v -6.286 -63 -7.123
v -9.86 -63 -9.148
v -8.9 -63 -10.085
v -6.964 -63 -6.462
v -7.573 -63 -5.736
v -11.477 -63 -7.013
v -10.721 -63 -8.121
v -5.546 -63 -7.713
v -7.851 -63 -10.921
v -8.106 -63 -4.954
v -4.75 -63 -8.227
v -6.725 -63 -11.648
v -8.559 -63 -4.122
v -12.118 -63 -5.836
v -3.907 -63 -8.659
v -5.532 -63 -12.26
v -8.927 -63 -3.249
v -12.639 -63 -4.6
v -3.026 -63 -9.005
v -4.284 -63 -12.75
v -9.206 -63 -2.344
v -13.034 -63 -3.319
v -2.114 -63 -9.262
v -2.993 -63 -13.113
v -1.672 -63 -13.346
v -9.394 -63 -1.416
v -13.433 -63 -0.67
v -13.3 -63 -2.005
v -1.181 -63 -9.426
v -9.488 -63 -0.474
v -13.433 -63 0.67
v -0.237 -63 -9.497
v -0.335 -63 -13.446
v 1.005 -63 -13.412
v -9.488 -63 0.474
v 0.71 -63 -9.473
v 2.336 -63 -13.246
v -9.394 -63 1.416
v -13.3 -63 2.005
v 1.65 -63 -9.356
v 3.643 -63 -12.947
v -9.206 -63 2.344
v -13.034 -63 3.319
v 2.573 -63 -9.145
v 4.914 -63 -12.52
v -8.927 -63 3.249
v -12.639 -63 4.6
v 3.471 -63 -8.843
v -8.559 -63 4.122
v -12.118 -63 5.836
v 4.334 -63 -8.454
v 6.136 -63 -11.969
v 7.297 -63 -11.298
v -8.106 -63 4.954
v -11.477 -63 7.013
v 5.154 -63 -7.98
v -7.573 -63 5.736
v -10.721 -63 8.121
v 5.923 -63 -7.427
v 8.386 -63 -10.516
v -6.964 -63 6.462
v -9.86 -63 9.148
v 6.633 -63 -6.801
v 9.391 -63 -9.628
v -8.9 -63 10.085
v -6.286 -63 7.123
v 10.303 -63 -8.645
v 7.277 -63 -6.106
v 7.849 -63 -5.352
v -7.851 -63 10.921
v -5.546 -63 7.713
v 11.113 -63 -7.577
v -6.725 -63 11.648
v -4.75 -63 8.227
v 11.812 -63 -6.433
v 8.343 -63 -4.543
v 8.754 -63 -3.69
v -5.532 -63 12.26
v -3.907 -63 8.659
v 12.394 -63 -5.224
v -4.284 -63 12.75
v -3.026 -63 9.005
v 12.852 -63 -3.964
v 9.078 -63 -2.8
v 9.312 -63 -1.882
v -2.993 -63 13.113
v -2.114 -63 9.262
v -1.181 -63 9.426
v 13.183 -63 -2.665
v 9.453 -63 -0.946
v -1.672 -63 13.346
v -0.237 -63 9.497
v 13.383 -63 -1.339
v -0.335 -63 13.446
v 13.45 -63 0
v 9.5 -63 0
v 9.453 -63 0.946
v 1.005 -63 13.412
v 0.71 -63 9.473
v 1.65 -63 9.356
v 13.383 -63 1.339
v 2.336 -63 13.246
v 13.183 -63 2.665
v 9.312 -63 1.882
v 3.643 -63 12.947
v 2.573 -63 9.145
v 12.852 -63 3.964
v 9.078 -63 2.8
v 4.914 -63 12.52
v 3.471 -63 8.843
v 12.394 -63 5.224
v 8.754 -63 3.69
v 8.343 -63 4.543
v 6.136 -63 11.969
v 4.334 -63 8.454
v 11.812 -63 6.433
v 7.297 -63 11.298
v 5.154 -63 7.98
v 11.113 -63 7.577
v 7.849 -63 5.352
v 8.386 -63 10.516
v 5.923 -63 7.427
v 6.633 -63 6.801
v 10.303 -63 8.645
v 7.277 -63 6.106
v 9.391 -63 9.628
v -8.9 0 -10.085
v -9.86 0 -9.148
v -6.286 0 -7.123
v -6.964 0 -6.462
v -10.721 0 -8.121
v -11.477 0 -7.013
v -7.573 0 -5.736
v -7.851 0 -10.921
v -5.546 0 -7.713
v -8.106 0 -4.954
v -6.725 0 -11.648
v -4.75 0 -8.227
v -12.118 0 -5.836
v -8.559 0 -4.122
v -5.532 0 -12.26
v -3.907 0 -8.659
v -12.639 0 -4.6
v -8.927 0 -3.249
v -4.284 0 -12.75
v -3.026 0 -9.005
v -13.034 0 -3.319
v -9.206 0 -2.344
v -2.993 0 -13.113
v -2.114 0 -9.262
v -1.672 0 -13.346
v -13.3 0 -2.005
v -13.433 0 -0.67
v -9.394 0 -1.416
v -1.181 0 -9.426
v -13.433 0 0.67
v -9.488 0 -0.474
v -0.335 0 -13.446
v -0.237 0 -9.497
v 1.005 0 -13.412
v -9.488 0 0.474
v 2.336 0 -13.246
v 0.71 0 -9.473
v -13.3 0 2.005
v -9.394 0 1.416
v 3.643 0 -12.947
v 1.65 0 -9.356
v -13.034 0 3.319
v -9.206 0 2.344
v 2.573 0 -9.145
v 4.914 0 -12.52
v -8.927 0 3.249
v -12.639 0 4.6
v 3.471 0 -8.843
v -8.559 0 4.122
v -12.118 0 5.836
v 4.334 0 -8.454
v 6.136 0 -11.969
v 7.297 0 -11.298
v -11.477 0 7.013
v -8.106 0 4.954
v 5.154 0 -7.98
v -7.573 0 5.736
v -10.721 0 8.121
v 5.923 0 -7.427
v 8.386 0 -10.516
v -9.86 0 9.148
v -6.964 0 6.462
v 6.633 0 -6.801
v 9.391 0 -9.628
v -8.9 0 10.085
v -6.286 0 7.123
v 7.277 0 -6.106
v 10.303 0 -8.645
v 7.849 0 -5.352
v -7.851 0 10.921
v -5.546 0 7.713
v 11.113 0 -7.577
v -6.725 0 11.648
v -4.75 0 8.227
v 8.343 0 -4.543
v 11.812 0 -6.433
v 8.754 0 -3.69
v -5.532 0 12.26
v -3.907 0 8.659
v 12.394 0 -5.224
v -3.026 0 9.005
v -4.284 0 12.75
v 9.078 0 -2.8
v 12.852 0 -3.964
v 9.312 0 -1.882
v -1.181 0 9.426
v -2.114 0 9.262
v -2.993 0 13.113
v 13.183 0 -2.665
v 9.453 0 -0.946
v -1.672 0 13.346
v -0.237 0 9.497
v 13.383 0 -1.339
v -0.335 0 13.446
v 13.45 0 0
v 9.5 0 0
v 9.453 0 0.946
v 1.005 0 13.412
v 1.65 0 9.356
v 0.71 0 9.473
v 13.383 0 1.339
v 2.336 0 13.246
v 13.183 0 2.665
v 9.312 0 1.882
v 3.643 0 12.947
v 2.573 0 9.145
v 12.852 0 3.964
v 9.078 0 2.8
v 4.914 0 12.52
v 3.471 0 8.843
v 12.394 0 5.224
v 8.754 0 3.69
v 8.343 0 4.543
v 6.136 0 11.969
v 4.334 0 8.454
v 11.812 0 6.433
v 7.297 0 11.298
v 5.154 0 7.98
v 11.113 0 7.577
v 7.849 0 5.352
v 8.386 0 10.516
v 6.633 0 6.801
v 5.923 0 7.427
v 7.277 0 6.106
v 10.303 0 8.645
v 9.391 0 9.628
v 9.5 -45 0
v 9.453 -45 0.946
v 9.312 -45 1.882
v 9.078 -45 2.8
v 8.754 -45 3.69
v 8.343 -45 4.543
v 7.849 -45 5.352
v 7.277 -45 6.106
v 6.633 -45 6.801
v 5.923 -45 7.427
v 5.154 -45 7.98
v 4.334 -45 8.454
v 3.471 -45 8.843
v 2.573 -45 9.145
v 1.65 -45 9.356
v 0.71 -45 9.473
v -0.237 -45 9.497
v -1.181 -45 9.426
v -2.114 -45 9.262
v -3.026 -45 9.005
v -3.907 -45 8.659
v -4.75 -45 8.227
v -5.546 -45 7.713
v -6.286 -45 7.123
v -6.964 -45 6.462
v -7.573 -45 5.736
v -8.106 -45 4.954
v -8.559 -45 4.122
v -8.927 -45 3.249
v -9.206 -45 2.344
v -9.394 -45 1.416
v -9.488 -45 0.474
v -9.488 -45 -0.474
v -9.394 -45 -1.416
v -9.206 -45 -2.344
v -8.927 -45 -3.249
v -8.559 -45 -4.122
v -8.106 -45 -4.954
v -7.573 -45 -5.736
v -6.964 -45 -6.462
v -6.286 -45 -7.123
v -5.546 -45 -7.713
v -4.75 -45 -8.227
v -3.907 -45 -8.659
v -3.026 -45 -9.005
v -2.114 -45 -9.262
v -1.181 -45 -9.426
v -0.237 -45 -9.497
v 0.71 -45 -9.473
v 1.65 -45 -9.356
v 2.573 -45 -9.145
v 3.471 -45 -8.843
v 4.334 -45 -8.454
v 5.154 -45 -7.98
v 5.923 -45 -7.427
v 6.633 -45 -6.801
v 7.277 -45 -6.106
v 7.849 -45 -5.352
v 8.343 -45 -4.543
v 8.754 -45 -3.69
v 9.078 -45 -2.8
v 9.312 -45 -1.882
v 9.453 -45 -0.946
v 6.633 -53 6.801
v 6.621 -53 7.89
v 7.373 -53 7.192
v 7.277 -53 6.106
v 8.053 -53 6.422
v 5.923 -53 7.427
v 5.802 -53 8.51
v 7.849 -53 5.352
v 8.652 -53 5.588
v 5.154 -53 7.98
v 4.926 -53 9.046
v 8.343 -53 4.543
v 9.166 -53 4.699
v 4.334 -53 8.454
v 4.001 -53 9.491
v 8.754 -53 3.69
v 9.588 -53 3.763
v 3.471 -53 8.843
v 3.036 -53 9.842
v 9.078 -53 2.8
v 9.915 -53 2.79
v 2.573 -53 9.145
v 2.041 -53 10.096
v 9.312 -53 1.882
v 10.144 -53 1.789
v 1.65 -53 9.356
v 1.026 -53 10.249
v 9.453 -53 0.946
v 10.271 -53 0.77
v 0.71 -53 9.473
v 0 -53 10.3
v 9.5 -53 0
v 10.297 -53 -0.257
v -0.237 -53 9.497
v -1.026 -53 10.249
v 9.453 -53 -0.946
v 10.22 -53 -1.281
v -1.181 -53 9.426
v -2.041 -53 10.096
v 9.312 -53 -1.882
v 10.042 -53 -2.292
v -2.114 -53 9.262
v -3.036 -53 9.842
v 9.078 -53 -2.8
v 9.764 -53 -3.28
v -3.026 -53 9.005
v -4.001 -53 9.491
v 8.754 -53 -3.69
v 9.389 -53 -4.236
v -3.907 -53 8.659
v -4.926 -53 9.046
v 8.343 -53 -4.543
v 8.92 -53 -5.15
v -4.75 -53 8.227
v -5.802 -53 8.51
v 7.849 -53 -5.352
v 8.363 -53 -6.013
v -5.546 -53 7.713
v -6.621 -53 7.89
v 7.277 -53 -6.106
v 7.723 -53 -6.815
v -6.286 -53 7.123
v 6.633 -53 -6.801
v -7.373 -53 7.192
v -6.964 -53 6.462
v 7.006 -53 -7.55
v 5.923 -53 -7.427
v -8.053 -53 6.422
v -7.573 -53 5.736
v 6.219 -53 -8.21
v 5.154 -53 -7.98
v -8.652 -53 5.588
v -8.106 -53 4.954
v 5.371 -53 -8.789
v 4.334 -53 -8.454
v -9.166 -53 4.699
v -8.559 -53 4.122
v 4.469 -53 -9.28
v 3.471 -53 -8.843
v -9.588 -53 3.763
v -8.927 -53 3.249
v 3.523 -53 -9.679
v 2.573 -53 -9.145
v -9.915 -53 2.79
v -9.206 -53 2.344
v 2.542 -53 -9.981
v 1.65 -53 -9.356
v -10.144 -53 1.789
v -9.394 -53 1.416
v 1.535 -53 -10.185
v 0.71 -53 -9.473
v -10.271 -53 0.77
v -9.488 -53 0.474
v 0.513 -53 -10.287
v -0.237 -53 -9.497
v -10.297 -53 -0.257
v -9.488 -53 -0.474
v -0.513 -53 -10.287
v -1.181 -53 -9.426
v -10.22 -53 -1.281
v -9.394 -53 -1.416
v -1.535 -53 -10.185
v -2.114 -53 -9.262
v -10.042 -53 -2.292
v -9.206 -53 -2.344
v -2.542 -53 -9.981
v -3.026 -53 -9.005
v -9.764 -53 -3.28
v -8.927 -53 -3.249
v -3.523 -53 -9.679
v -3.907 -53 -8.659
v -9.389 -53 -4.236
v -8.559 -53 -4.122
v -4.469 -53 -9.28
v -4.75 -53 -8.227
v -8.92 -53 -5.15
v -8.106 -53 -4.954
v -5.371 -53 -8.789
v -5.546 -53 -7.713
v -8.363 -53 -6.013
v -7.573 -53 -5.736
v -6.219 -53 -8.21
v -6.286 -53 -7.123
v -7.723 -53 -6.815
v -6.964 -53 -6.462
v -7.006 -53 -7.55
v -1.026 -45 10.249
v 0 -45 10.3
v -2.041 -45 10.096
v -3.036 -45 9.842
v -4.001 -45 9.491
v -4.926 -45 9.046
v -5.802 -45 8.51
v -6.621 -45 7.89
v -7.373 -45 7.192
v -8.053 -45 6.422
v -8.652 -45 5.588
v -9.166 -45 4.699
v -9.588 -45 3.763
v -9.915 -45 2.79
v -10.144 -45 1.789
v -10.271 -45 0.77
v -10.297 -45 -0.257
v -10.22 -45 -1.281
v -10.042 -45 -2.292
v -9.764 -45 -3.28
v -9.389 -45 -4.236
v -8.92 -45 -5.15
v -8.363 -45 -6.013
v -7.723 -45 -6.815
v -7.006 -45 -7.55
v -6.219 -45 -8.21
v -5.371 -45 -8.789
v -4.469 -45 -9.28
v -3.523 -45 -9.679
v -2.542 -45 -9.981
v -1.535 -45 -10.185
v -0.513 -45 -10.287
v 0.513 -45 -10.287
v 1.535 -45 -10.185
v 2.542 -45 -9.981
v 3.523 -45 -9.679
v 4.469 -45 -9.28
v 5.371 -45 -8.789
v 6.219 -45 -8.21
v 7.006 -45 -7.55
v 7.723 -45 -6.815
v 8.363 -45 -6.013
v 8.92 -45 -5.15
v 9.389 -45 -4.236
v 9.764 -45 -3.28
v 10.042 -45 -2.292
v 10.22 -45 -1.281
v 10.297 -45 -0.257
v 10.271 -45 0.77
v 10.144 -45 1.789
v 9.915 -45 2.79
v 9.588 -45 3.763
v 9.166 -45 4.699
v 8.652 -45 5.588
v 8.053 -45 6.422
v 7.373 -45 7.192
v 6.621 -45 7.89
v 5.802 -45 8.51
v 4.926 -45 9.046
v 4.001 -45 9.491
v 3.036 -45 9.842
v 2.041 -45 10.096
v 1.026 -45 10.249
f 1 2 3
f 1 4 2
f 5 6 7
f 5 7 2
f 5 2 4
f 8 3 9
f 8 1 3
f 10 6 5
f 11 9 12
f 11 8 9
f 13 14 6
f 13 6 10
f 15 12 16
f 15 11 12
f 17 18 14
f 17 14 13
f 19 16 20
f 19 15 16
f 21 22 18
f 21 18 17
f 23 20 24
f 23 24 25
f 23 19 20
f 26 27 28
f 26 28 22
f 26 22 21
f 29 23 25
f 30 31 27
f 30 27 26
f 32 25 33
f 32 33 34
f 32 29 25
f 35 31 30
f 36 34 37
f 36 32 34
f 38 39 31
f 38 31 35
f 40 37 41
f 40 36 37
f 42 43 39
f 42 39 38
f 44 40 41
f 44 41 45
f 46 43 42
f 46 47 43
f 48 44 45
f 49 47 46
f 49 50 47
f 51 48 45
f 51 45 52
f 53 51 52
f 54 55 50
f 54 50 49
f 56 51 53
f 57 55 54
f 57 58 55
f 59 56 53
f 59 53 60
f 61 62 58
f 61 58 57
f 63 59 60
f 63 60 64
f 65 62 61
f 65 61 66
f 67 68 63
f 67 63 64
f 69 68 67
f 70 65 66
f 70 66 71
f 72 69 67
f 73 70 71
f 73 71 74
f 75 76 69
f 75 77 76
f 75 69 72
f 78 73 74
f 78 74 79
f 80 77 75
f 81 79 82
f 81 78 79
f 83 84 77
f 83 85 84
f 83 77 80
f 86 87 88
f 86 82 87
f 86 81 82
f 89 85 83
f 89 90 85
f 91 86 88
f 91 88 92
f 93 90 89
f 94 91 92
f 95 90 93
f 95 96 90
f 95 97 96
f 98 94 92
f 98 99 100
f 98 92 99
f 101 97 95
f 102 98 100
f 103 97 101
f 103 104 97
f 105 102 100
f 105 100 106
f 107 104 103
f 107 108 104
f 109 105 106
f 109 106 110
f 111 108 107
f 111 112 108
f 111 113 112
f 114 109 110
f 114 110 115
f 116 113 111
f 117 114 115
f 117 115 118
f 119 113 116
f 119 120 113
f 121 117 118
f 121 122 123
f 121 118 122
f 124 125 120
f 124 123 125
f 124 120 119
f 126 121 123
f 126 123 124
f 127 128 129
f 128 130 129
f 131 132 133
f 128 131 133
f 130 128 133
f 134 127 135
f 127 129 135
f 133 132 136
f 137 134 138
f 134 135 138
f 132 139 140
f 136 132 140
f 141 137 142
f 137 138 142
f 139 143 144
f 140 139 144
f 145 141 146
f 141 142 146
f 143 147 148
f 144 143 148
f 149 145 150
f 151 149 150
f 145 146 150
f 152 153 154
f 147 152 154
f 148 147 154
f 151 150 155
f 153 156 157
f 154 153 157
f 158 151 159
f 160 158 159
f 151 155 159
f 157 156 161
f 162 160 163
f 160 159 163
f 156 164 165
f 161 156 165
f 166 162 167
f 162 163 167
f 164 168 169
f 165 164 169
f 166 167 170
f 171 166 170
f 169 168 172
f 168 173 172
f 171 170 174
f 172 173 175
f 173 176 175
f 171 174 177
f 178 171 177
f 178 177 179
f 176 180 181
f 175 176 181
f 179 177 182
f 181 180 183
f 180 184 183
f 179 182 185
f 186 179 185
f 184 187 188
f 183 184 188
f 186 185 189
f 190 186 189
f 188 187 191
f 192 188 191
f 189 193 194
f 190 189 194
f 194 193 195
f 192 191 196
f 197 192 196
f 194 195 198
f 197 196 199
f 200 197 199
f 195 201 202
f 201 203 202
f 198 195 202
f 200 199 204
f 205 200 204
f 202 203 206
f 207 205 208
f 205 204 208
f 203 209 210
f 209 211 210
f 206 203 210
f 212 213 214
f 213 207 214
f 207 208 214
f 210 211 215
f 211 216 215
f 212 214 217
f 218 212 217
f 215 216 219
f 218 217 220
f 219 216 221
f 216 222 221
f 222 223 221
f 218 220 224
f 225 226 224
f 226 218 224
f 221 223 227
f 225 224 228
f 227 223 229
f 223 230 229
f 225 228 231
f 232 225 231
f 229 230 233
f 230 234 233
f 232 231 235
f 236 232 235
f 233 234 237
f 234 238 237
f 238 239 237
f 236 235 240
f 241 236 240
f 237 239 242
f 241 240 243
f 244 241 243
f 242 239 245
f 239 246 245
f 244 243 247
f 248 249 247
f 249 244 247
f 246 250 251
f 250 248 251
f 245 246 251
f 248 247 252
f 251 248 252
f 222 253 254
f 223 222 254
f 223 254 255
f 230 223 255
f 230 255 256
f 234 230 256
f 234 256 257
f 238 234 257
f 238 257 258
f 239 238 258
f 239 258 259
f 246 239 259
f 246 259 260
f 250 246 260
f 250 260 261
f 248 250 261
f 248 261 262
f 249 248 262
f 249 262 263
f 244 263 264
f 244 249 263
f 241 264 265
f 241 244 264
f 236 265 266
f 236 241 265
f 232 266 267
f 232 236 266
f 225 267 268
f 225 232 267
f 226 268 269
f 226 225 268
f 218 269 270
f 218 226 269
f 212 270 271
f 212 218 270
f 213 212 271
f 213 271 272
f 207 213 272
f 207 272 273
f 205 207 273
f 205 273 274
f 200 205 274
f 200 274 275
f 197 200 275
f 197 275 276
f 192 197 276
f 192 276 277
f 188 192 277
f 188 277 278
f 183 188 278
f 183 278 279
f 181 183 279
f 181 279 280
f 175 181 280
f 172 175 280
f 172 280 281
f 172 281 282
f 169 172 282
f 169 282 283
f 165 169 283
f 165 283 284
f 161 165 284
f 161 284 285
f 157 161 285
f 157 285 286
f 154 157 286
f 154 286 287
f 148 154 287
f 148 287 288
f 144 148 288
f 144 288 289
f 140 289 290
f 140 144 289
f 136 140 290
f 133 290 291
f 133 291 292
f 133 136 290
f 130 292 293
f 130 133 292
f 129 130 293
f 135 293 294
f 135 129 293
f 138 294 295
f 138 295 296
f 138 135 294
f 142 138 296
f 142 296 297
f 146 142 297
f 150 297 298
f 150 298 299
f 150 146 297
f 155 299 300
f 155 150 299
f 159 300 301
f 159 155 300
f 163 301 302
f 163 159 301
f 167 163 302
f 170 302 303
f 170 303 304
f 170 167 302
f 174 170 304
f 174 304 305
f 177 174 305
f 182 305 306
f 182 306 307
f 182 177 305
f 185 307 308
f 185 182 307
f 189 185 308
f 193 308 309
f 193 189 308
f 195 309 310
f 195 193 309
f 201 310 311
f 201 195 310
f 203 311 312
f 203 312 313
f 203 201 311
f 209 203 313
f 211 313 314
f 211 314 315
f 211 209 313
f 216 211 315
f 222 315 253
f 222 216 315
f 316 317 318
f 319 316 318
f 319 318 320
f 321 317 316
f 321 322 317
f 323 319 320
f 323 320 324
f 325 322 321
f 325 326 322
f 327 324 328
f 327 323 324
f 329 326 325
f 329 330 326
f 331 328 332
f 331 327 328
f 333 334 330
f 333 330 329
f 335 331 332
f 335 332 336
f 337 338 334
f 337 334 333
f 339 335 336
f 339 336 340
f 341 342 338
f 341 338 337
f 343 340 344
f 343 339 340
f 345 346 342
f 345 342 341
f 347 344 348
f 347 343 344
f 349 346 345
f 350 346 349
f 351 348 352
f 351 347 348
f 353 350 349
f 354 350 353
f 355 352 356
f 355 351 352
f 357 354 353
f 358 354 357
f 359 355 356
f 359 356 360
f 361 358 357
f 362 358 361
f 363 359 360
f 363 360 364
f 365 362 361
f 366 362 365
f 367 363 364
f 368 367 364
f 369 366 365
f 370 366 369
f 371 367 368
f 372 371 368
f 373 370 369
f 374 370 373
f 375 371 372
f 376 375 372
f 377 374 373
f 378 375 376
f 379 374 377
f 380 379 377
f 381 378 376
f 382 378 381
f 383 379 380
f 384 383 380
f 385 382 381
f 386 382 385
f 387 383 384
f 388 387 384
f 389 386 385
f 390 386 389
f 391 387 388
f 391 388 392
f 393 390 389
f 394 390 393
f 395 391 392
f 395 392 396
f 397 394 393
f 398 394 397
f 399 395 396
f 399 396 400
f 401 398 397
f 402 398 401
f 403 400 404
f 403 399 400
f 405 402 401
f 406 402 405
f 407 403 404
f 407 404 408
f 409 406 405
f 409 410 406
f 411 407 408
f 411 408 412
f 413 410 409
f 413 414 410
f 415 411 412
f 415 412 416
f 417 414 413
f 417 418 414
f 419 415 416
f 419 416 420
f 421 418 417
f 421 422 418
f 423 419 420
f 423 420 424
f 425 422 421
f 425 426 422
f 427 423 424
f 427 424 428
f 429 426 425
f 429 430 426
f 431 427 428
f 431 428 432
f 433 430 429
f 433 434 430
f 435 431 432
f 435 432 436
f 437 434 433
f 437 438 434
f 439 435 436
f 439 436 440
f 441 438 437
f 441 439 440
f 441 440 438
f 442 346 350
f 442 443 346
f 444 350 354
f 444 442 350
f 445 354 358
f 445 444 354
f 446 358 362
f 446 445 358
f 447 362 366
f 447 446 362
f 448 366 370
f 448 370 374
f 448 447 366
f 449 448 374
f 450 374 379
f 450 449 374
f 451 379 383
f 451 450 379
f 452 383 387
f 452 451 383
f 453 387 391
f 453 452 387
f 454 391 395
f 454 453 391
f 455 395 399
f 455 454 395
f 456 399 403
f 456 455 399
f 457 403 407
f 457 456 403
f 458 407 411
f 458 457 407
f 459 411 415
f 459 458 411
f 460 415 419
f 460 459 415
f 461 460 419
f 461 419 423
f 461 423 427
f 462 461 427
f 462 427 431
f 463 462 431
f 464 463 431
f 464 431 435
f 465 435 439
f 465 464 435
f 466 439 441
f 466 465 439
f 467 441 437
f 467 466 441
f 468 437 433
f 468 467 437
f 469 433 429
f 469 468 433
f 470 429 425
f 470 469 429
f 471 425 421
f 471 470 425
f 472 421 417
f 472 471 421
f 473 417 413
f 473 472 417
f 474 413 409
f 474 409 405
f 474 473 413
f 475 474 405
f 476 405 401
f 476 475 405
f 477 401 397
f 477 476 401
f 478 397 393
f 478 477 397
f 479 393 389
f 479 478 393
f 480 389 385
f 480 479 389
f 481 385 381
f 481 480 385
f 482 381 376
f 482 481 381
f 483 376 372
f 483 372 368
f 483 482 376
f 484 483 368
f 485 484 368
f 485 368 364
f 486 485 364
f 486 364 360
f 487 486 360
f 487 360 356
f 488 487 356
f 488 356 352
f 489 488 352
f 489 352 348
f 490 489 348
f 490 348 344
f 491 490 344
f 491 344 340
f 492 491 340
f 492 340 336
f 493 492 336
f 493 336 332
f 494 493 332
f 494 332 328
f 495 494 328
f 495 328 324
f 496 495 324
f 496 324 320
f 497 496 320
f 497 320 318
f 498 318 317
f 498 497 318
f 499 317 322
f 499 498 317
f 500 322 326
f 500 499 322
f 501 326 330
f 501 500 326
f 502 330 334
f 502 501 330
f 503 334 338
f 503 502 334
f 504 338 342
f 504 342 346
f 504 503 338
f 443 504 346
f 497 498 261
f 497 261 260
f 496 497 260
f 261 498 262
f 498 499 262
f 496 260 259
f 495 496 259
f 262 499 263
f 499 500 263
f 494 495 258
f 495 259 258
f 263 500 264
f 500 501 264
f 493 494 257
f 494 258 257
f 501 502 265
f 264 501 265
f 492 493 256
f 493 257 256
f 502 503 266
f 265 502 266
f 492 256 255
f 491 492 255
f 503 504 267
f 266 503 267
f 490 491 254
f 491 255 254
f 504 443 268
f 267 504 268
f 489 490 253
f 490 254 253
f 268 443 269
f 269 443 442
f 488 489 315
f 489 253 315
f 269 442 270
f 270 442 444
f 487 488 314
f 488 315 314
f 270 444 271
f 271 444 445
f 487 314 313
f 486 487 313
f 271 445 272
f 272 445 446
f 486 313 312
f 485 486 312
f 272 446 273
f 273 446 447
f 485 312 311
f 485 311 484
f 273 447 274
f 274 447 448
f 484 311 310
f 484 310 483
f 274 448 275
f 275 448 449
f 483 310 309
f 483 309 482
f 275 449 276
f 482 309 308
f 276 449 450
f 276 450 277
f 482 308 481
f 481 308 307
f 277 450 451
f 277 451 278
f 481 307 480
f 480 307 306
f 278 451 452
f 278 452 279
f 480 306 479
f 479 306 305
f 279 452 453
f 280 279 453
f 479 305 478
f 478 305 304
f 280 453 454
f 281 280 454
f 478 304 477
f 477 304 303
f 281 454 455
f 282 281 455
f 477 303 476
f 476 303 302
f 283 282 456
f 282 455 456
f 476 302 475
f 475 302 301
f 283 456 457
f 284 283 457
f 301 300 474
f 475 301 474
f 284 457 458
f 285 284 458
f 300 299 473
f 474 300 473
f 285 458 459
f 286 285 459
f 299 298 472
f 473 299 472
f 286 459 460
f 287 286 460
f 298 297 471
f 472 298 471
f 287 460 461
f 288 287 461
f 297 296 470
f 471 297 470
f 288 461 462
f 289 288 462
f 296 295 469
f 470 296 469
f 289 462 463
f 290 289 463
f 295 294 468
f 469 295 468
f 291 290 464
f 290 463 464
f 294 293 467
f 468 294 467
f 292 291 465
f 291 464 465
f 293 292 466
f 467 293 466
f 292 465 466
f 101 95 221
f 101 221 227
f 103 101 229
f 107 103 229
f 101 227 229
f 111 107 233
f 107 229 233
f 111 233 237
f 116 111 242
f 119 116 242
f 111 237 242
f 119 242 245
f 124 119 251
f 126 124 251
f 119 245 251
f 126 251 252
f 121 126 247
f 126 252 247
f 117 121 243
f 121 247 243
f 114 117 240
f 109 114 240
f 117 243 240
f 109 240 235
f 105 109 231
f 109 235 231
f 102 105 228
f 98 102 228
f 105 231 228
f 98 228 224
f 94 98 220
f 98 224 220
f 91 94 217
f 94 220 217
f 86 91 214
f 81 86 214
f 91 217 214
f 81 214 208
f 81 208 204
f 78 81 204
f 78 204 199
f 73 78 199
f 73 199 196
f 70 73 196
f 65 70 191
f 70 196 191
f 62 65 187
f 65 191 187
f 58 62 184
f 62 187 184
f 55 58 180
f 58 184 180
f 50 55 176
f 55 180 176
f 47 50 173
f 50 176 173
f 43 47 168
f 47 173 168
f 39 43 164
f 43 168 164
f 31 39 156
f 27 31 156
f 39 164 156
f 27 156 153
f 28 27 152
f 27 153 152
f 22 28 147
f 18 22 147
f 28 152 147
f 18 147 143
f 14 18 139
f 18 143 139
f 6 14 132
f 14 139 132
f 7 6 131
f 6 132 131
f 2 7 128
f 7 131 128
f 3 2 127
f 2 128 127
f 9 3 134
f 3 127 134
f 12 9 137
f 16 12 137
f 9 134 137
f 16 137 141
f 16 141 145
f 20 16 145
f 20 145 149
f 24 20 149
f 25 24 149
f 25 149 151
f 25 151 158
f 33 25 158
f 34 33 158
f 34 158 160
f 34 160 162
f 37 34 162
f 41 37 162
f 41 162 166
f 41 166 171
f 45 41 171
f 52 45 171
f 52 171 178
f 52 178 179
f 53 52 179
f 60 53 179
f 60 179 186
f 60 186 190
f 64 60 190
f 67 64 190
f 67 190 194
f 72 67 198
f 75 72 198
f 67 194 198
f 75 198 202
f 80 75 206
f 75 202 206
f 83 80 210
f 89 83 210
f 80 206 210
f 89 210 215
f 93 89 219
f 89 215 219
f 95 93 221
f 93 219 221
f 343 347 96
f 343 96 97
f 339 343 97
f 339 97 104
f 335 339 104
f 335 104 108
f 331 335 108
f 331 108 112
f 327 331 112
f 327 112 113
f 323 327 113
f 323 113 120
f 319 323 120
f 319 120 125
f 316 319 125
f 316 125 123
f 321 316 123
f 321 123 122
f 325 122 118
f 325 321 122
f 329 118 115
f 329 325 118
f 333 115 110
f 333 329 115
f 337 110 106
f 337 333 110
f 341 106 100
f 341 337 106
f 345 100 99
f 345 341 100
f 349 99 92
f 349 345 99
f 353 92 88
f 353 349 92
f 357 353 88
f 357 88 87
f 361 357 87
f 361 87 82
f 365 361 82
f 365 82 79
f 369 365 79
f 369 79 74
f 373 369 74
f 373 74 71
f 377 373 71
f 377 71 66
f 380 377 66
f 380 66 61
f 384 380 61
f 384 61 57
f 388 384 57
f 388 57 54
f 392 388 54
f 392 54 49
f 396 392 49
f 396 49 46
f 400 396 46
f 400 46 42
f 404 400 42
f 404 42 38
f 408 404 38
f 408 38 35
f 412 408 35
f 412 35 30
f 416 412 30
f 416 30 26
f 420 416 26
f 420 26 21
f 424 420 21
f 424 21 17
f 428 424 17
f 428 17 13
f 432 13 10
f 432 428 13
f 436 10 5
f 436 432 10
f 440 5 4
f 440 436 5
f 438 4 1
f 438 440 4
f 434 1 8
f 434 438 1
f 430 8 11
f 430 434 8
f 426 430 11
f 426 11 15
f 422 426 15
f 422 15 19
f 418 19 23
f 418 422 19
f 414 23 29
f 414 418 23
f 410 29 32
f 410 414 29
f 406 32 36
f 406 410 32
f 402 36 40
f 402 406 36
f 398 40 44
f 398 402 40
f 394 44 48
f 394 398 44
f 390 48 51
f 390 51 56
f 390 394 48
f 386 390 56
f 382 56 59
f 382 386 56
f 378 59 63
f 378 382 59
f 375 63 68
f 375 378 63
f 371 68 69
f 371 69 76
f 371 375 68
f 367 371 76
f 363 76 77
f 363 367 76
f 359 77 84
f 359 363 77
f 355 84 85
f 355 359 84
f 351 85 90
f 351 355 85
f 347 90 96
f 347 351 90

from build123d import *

# Parameters (mm, degrees)
F0_R     = 13.45
F0_R_2   = 9.5
F1_DEPTH = 63
F2_W     = 8
F2_H     = 0.8


with BuildPart() as f1:
    # F0 (on Front) → F1 (new body)
    with BuildSketch(Plane.XZ):
        Circle(F0_R)
        Circle(F0_R_2, mode=Mode.SUBTRACT)
    extrude(amount=F1_DEPTH)

    # F2 (on Right) → F3 (revolve, cut)
    with BuildSketch(Plane.YZ):
        with Locations((-49, 9.9)):
            Rectangle(F2_W, F2_H)
    revolve(axis=Axis((0, -31.5, 0), (0, -1, 0)), mode=Mode.SUBTRACT)


solid = f1.part
